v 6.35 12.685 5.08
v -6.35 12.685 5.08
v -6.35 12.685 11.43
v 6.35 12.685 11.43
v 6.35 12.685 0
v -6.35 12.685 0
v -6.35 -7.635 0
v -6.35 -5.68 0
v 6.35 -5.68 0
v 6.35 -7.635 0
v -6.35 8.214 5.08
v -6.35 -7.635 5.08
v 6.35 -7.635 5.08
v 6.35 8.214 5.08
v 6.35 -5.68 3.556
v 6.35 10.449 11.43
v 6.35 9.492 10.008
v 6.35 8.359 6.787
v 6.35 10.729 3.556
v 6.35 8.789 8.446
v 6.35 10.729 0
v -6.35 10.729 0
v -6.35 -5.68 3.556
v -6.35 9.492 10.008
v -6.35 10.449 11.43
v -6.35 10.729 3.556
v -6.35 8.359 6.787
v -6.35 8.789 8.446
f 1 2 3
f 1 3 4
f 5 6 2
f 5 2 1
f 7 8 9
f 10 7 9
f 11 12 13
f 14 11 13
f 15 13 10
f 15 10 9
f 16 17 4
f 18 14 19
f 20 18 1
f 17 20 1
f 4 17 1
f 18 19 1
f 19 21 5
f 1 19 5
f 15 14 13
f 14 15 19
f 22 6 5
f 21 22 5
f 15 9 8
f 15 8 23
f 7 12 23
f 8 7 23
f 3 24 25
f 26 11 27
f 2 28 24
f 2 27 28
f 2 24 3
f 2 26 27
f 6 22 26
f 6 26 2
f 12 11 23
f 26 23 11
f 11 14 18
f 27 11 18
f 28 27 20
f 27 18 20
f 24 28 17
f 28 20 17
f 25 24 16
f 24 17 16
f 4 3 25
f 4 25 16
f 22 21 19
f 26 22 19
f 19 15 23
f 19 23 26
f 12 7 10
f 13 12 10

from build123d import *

# Parameters (mm, degrees)
F0_W     = 12.7
F0_H     = 20.32
F1_DEPTH = 5.08
F2_W     = 12.7
F2_H     = 4.4710185971
F3_DEPTH = 6.35
F5_DEPTH = 25.4
F6_W     = 16.4084
F6_H     = 3.556
F7_DEPTH = 25.4


with BuildPart() as f1:
    # F0 (on Top) → F1 (new body)
    with BuildSketch(Plane.XY):
        with Locations((0, 2.5246988346)):
            Rectangle(F0_W, F0_H)
    extrude(amount=F1_DEPTH)

    # F2 (on face) → F3 (join)
    with BuildSketch(Plane.XY.offset(5.08)):
        with Locations((0, 10.4491895361)):
            Rectangle(F2_W, F2_H)
    extrude(amount=F3_DEPTH)

    # F4 (on face) → F5 (cut)
    with BuildSketch(Plane.YZ.offset(6.35)):
        with BuildLine():
            ThreePointArc((8.2136802375, 5.08), (8.788877567, 8.4460066037), (10.4491895361, 11.43))
            Line((10.4491895361, 11.43), (8.2136802375, 11.43))
            Line((8.2136802375, 11.43), (8.2136802375, 5.08))
        make_face()
    extrude(amount=-F5_DEPTH, mode=Mode.SUBTRACT)

    # F6 (on face) → F7 (cut)
    with BuildSketch(Plane.YZ.offset(6.35)):
        with Locations((2.5246988346, 1.778)):
            Rectangle(F6_W, F6_H)
    extrude(amount=-F7_DEPTH, mode=Mode.SUBTRACT)


solid = f1.part
